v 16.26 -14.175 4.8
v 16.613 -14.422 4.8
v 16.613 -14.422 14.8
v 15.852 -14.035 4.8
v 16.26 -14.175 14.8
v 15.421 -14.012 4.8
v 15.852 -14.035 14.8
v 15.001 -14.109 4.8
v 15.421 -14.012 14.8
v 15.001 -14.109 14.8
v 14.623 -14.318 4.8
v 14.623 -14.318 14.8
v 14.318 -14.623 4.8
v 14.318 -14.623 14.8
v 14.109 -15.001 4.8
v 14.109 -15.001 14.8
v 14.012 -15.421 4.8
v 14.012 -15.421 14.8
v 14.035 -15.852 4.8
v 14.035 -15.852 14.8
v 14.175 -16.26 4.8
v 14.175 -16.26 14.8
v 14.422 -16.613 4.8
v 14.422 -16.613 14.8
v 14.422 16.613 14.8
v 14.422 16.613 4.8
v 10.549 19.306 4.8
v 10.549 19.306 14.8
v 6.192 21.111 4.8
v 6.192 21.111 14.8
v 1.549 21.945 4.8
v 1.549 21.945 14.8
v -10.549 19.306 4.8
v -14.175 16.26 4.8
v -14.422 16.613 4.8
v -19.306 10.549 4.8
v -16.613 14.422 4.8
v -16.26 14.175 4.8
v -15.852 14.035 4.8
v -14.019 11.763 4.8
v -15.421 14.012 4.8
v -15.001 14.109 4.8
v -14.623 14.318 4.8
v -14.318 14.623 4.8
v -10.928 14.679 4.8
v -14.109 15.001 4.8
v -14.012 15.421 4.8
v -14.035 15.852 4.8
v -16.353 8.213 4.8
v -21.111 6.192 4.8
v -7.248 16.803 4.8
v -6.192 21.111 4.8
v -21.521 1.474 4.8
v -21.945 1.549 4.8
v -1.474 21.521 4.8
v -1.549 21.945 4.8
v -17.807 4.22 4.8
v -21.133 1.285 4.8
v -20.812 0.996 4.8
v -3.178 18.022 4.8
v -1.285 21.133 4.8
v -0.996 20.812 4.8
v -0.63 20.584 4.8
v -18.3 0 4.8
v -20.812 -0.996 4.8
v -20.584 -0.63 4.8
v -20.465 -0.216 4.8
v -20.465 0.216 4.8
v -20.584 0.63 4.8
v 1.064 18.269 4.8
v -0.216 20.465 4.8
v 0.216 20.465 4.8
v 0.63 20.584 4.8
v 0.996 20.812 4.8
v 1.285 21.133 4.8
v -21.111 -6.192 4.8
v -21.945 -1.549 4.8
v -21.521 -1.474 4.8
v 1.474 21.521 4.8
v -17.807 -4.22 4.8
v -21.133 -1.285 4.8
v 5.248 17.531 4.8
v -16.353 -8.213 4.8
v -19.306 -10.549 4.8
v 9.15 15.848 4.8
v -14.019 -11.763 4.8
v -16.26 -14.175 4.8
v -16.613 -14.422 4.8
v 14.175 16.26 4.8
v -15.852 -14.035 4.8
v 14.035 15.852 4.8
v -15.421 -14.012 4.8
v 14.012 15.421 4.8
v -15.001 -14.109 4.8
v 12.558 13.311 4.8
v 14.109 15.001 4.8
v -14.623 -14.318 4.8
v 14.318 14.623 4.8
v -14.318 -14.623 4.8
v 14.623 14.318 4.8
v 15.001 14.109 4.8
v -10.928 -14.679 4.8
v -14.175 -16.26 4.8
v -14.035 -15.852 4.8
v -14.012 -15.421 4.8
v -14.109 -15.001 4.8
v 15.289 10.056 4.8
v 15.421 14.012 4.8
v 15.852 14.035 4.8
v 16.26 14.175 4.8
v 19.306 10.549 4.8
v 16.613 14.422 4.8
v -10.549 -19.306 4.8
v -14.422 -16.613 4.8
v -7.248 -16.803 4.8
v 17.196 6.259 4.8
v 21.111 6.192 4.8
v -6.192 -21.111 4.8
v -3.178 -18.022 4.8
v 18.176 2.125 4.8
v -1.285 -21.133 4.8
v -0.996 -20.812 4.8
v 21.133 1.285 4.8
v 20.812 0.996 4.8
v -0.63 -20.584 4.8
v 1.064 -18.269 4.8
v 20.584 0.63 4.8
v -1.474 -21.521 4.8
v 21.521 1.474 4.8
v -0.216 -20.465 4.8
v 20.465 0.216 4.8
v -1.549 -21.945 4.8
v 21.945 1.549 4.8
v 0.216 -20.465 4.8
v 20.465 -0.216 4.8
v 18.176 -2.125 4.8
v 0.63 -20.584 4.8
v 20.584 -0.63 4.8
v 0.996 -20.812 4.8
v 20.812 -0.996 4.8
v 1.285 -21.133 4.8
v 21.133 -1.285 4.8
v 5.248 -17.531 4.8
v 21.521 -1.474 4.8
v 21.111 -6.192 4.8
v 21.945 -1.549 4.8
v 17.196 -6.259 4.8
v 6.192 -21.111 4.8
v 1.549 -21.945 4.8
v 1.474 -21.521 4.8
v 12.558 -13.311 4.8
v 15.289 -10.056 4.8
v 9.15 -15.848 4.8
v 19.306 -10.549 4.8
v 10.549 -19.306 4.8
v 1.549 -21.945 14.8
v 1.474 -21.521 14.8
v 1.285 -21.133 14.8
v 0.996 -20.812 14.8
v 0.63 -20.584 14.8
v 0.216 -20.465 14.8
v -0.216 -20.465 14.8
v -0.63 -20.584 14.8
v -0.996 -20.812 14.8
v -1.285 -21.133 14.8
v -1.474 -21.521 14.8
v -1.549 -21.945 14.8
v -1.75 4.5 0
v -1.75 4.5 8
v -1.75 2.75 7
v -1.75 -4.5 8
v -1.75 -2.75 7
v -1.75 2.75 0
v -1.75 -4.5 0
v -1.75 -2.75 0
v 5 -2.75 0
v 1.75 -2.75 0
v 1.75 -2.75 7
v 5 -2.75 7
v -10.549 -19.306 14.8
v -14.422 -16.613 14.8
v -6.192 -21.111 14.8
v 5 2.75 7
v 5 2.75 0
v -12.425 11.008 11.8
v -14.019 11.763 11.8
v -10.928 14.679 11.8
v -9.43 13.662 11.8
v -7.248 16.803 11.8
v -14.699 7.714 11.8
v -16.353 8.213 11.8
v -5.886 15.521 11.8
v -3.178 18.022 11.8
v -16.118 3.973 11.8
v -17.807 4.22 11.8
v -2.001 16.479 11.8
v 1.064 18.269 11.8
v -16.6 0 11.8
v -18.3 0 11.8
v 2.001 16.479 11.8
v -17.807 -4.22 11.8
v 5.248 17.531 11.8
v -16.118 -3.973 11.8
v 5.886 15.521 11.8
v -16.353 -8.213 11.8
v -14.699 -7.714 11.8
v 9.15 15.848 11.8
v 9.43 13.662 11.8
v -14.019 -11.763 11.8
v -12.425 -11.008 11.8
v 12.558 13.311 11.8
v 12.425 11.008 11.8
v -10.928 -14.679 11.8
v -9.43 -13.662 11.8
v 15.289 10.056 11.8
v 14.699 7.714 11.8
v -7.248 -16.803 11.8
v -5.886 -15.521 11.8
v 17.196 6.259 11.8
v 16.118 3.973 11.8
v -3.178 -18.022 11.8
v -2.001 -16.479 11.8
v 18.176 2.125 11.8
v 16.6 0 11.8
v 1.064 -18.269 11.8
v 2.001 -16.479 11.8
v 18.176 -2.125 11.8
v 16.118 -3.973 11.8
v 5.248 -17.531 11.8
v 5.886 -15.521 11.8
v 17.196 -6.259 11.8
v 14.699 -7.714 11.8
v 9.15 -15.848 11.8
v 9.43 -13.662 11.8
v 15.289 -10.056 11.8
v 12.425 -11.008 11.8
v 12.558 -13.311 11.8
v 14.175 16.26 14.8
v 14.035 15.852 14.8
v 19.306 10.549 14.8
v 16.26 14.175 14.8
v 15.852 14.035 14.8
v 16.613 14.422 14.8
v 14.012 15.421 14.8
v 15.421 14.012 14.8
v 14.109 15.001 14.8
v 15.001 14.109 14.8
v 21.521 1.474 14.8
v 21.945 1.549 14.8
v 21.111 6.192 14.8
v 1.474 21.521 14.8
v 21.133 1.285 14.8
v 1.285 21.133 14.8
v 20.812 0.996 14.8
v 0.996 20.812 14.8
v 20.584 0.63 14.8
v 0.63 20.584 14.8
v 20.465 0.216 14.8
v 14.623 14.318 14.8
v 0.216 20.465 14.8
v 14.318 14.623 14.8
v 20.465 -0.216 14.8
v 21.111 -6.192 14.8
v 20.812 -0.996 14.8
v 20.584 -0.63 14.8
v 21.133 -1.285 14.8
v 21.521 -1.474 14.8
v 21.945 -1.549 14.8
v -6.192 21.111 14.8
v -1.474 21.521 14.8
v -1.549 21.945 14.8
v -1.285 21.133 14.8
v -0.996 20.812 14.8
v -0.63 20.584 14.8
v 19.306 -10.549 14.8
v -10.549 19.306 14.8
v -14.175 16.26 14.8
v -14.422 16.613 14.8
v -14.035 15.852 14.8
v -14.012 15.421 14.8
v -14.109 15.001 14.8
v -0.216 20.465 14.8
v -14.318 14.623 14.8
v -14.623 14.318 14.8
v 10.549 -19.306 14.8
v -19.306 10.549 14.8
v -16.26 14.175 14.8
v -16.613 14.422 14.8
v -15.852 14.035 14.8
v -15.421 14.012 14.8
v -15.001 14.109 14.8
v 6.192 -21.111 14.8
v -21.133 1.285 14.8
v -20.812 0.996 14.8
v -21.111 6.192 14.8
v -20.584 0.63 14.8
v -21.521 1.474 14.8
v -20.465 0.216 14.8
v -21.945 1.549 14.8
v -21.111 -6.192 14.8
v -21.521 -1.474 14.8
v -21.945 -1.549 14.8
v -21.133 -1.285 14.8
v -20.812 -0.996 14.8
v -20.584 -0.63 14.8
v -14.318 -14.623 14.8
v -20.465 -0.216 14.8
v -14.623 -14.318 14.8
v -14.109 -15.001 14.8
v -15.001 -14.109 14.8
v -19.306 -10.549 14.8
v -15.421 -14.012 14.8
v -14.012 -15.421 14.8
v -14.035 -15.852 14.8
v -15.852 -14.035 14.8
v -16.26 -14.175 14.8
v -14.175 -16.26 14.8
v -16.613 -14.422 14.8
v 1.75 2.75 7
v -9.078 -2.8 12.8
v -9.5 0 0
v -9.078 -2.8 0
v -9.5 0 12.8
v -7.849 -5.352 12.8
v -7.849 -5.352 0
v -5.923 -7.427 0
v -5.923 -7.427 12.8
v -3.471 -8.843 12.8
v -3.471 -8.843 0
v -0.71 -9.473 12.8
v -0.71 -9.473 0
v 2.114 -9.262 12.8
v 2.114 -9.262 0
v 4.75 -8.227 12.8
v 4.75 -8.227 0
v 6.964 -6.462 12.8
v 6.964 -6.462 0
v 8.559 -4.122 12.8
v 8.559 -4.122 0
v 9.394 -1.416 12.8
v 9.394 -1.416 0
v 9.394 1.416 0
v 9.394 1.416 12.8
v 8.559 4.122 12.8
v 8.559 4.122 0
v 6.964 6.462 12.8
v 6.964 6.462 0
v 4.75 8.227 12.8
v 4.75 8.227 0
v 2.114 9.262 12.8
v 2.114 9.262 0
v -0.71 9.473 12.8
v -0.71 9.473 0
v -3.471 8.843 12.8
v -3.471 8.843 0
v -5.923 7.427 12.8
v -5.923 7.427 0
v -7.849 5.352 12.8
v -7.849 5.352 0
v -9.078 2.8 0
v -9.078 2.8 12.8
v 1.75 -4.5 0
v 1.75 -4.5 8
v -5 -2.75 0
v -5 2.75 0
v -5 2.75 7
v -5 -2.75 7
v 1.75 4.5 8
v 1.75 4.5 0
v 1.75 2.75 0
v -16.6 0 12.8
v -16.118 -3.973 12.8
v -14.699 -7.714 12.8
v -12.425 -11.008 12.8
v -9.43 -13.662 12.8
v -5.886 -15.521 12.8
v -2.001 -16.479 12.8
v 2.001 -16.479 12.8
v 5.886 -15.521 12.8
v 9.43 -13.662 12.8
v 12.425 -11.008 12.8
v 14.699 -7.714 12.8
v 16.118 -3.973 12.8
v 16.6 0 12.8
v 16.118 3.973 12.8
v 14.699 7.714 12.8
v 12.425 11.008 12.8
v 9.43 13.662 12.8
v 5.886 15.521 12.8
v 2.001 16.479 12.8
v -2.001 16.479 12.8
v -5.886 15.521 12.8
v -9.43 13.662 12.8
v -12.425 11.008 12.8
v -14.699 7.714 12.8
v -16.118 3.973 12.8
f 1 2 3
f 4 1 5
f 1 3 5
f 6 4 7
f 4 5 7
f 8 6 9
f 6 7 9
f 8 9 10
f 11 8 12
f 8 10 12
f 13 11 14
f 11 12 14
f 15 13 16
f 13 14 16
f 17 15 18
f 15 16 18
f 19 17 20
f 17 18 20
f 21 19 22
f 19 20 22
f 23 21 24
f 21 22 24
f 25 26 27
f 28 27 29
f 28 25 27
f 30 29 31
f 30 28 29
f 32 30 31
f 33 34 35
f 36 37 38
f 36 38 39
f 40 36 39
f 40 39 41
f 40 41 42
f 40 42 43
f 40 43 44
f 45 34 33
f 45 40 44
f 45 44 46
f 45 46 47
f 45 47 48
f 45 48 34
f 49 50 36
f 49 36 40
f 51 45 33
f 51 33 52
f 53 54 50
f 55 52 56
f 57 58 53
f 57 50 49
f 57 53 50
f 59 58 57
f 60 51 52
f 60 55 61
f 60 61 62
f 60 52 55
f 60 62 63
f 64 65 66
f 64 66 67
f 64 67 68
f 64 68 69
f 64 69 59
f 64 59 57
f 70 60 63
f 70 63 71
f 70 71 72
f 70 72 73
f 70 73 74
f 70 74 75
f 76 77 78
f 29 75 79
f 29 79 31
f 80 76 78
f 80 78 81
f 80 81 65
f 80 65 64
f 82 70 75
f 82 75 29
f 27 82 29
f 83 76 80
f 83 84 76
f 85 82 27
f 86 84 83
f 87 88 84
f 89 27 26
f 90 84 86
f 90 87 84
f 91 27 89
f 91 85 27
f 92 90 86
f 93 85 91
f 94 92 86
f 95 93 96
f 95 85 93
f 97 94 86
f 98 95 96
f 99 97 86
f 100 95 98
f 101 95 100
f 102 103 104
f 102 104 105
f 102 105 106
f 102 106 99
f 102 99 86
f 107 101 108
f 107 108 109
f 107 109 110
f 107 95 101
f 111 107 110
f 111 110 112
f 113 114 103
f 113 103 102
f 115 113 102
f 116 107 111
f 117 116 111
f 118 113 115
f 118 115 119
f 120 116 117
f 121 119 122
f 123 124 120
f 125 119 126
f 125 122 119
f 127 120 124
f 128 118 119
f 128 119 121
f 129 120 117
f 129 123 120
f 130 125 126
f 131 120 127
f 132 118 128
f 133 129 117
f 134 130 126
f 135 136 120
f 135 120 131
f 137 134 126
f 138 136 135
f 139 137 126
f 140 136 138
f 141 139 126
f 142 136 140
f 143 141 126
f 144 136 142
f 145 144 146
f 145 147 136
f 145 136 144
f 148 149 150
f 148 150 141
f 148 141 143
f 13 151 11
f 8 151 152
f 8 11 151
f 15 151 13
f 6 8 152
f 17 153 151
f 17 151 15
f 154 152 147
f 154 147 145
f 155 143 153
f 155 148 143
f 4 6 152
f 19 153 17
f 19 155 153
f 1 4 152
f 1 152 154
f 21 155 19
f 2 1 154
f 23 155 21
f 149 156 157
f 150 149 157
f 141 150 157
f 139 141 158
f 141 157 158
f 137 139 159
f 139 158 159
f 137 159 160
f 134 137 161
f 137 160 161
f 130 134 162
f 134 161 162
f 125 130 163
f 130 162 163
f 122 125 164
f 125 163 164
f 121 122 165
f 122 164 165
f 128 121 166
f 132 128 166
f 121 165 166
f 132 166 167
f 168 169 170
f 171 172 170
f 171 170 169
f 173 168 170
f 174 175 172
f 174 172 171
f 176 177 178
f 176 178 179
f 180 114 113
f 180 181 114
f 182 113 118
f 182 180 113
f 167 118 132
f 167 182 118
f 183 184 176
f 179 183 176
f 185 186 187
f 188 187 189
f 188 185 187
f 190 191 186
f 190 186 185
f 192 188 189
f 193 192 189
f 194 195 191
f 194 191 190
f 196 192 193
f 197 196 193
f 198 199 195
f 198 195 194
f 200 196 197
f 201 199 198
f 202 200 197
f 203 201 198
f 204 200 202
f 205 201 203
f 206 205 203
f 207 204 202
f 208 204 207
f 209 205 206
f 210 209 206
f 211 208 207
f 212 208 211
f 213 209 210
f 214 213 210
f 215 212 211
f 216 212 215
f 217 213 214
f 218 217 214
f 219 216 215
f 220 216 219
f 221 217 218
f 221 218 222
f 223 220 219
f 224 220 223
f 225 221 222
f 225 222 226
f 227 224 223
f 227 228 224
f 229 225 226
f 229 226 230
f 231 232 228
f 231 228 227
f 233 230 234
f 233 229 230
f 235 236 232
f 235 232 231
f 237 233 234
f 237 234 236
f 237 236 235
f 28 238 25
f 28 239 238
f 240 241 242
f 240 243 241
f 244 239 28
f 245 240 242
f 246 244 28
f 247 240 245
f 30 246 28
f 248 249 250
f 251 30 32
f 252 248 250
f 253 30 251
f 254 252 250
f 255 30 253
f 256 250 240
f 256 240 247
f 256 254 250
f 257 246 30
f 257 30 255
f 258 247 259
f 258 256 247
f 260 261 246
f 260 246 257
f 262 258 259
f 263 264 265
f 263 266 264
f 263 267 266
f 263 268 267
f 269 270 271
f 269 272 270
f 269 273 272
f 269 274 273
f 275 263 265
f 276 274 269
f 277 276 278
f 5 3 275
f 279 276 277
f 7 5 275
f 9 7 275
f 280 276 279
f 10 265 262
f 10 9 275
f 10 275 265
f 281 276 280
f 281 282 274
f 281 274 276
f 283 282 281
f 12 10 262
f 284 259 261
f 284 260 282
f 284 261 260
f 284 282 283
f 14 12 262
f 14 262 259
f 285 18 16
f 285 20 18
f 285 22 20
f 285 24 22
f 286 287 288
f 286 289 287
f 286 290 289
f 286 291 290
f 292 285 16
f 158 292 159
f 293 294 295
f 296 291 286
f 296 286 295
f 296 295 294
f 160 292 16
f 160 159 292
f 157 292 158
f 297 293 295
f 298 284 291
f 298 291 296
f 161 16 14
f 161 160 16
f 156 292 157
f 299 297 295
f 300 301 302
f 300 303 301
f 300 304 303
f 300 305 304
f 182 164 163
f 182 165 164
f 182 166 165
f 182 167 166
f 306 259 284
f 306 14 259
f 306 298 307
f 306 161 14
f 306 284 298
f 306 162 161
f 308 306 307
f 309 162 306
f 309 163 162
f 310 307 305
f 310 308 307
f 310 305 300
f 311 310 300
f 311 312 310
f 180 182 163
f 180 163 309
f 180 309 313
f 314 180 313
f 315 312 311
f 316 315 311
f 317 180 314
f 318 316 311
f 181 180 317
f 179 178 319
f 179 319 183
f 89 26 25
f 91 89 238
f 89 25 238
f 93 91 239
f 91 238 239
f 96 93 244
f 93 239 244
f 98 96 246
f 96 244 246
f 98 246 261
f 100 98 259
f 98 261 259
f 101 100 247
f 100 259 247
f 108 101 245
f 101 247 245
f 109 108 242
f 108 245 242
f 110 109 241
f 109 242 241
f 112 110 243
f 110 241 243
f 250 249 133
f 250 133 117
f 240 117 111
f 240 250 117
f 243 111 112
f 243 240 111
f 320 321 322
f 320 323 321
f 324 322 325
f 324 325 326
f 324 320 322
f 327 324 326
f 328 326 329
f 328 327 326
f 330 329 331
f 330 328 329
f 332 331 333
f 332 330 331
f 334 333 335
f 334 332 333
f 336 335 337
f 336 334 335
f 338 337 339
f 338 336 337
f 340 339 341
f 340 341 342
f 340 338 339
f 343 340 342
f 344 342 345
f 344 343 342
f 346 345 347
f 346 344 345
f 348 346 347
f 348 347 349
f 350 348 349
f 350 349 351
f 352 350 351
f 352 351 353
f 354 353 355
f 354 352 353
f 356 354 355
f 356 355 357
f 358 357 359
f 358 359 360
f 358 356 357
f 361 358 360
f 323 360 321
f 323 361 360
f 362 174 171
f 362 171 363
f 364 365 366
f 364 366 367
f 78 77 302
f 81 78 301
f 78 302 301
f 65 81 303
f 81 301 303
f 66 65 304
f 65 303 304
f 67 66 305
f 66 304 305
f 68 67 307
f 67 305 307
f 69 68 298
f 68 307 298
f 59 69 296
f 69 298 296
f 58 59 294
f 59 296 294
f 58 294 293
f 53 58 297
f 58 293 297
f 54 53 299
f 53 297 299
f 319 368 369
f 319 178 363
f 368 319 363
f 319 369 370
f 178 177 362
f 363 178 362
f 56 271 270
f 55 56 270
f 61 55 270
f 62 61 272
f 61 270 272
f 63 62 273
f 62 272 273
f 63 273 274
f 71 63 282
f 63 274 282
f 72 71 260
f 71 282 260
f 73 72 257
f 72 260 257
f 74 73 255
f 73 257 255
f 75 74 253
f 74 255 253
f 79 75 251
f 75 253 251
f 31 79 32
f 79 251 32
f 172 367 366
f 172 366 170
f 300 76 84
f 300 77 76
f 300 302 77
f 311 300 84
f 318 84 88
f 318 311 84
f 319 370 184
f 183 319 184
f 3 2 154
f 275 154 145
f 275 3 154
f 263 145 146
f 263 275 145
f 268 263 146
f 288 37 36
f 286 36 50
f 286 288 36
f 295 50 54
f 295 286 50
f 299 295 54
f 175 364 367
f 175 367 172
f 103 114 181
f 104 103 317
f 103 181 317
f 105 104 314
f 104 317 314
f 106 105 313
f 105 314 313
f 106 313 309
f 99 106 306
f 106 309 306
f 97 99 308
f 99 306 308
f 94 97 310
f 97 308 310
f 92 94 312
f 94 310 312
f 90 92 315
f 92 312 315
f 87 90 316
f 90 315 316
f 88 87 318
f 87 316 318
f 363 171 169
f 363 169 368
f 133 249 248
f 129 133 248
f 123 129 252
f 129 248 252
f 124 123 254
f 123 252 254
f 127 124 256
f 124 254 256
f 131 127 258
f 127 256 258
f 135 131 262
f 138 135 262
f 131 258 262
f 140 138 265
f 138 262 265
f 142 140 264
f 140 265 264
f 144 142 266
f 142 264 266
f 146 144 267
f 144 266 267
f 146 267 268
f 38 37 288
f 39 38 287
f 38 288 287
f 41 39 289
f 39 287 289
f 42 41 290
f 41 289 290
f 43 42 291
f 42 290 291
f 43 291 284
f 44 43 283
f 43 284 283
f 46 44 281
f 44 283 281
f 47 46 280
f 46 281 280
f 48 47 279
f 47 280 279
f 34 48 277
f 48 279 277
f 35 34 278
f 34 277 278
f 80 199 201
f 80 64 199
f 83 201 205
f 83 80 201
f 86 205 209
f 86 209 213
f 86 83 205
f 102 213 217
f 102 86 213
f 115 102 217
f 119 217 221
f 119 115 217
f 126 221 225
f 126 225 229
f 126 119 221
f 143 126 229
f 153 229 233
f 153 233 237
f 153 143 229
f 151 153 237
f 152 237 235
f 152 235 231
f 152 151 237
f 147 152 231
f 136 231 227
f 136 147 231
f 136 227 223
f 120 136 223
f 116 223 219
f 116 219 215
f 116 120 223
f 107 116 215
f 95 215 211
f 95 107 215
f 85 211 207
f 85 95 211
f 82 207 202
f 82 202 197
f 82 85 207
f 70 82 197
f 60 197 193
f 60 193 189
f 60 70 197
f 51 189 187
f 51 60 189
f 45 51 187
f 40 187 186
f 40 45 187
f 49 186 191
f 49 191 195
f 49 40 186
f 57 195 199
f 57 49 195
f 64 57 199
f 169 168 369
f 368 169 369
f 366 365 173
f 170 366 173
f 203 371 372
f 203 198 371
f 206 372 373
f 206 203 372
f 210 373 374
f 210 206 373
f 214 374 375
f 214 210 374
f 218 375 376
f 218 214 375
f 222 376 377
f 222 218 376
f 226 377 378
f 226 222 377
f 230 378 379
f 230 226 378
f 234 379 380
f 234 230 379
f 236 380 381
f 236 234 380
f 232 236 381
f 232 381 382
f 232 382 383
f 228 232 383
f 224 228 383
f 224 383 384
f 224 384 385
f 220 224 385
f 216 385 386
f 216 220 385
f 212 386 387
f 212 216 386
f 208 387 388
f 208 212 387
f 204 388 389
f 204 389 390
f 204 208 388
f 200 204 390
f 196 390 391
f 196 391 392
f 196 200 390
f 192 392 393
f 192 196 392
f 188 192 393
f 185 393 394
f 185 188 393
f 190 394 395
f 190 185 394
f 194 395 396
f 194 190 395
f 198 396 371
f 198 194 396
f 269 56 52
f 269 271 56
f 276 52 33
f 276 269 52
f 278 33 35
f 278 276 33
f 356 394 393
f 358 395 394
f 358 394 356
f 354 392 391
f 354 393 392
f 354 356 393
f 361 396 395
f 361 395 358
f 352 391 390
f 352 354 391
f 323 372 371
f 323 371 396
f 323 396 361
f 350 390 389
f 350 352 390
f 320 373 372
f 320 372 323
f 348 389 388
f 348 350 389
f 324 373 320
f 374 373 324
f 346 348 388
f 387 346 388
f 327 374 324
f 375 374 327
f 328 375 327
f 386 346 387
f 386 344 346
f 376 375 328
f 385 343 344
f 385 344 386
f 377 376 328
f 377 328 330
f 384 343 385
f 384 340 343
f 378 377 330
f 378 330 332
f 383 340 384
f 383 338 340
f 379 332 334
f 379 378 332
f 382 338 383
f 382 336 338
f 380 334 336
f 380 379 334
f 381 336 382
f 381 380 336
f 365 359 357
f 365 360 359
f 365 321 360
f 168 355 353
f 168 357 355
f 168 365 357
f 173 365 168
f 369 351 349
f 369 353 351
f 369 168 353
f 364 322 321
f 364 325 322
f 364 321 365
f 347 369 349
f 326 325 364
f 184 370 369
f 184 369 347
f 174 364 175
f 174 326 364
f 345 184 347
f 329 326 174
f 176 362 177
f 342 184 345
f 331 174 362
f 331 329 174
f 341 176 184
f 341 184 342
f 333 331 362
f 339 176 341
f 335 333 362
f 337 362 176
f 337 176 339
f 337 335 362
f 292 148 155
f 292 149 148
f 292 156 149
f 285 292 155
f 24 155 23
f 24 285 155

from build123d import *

# Parameters (mm, degrees)
SKETCH004_W        = 3.5
SKETCH004_H        = 9
POCKET001_DEPTH    = 8
SKETCH005_W        = 10
SKETCH005_H        = 5.5
POCKET002_DEPTH    = 7
SKETCH007_R        = 1.55
POCKET003_DEPTH    = 142.723477
POLARPATTERN_COUNT = 8


with BuildPart() as part:
    # Sketch → Revolution (revolve)
    with BuildSketch(Plane.XZ):
        Polygon((-18.3, 4.8), (-22, 4.8), (-22, 14.8), (0, 14.8), (0, 0), (-9.5, 0), (-9.5, 12.8), (-16.6, 12.8), (-16.6, 11.8), (-18.3, 11.8), align=None)
    revolve(axis=Axis((0, 0, 0), (0, 0, 1)))

    # Sketch004 (on Face4 of Revolution) → Pocket001 (cut)
    with BuildSketch(Plane(origin=(0, 0, 0), x_dir=(1, 0, 0), z_dir=(0, 0, -1))):
        Rectangle(SKETCH004_W, SKETCH004_H)
    extrude(amount=-POCKET001_DEPTH, mode=Mode.SUBTRACT)

    # Sketch005 (on Face9 of Pocket001) → Pocket002 (cut)
    with BuildSketch(Plane(origin=(0, 0, 0), x_dir=(1, 0, 0), z_dir=(0, 0, -1))):
        Rectangle(SKETCH005_W, SKETCH005_H)
    extrude(amount=-POCKET002_DEPTH, mode=Mode.SUBTRACT)

    # Sketch007 (on Face5 of Pocket002) → Pocket003 (cut, through all)
    with BuildSketch(Plane(origin=(0, 0, 14.8), x_dir=(-1, 0, 0), z_dir=(0, 0, 1))):
        with Locations((-22, 0)):
            Circle(SKETCH007_R)
    pocket003 = extrude(amount=-POCKET003_DEPTH, mode=Mode.SUBTRACT)

    # PolarPattern: Pocket003 ×8 about axis
    polarpattern_axis = Axis((0, 0, 0), (0, 0, 1))
    for i in range(1, POLARPATTERN_COUNT):
        add(pocket003.rotate(polarpattern_axis, i * 360 / POLARPATTERN_COUNT), mode=Mode.SUBTRACT)


solid = part.part
